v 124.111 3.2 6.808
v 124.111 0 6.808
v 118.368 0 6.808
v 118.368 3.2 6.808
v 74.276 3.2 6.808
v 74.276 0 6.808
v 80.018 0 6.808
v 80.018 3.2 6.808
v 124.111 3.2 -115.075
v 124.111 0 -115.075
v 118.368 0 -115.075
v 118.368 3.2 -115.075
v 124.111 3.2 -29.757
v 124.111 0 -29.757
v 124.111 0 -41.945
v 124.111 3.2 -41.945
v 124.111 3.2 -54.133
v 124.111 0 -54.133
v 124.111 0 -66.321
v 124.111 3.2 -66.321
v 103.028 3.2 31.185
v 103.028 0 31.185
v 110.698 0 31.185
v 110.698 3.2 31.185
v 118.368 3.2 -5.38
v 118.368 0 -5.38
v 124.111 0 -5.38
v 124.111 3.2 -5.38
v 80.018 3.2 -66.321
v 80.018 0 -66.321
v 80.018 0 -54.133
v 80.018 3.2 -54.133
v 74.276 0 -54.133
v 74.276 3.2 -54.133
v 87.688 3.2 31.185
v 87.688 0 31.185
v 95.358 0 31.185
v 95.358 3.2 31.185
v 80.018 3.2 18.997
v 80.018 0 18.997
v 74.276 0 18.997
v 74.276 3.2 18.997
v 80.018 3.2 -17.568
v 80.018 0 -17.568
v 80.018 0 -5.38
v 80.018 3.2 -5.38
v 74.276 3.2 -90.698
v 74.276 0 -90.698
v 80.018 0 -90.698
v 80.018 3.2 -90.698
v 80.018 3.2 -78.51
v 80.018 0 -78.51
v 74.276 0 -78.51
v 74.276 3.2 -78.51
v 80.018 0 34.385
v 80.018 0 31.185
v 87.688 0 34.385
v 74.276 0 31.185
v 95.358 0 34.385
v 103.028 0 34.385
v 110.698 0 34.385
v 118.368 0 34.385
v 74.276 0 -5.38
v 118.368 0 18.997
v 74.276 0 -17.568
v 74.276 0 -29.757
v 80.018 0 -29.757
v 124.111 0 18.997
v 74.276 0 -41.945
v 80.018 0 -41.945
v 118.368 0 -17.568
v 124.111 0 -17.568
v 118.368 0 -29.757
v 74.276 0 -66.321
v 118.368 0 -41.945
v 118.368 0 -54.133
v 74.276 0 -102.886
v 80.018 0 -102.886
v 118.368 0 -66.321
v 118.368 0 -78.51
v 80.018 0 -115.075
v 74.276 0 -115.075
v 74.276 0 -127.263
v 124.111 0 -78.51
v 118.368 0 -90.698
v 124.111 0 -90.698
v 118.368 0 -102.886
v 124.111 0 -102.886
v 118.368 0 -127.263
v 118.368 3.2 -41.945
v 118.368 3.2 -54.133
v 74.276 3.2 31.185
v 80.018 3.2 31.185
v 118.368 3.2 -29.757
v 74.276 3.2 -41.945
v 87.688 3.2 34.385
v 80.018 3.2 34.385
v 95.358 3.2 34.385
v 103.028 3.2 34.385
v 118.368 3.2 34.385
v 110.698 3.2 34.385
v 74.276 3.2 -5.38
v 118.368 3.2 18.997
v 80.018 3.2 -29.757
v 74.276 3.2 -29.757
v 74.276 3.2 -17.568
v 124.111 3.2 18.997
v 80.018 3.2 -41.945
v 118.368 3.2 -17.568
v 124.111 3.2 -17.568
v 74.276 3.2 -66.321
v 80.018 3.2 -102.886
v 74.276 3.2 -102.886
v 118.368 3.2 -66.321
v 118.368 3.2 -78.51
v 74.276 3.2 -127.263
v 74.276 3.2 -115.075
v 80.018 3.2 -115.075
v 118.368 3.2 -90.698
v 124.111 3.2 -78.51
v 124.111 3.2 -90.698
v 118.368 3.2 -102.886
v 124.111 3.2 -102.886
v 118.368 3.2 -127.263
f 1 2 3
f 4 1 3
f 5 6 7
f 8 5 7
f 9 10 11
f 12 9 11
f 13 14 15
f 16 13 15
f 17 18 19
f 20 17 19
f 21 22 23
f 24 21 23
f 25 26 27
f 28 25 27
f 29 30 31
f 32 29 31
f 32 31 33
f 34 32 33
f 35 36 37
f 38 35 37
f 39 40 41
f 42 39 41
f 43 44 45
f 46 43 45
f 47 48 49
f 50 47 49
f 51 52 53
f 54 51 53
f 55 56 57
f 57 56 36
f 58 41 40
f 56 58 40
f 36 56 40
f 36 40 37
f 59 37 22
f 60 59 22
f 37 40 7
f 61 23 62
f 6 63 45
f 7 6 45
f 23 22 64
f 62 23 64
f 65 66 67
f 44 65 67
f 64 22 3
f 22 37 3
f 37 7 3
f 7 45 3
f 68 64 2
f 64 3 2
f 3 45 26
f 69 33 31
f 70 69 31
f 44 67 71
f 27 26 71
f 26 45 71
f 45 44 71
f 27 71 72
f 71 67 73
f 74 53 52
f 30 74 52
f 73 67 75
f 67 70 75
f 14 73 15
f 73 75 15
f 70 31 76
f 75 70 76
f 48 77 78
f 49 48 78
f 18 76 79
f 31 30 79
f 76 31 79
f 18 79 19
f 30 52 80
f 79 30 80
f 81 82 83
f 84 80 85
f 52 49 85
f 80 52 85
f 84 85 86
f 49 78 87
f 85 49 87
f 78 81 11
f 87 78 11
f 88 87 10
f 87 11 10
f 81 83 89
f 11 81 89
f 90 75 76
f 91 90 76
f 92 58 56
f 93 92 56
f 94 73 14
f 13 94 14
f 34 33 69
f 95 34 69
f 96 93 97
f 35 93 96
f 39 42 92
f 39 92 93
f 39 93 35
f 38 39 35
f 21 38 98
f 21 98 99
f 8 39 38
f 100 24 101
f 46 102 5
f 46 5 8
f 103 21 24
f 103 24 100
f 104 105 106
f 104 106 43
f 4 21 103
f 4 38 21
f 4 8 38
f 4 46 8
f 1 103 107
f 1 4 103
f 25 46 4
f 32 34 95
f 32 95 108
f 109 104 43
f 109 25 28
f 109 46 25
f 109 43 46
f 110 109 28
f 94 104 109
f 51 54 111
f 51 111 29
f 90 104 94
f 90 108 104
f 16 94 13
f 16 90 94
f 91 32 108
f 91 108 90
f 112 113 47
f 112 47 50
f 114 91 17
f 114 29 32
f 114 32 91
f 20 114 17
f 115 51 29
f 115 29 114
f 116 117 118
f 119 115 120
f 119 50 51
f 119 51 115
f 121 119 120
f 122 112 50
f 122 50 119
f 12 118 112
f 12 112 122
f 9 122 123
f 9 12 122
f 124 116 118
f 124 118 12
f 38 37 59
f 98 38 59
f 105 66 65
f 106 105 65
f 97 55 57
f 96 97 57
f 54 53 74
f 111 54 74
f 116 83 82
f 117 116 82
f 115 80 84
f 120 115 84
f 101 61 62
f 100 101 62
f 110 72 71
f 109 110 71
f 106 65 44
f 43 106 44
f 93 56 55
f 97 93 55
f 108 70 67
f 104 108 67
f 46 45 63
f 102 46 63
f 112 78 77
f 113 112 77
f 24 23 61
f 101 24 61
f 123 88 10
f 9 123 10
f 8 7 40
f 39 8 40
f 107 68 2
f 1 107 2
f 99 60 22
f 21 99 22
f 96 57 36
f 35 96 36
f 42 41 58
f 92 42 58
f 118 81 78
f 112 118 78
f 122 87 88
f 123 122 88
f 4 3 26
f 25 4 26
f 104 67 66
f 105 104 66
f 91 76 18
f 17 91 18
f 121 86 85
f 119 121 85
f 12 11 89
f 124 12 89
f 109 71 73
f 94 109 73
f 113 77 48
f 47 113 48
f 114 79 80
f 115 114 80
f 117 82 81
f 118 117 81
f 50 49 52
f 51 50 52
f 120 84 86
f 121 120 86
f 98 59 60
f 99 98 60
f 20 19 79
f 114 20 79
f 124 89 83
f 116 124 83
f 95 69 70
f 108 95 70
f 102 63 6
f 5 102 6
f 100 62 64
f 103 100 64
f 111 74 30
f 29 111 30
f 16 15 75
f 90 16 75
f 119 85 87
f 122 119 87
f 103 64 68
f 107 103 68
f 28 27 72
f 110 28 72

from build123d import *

# Parameters (mm, degrees)
BOSS_EXTRUDE3_DEPTH = 3.2


with BuildPart() as part:
    # Sketch1 → Boss-Extrude3 (new body)
    with BuildSketch(Plane(origin=(0, 0, 0), x_dir=(1, 0, 0), z_dir=(0, 1, 0))):
        Polygon((80.018202502, -34.385003933), (87.688185358, -34.385003933), (87.688185358, -31.185003933), (95.358168214, -31.185003933), (95.358168214, -34.385003933), (103.02815107, -34.385003933), (103.02815107, -31.185003933), (110.698133926, -31.185003933), (110.698133926, -34.385003933), (118.368116782, -34.385003933), (118.368116782, -18.996696241), (124.110679366, -18.996696241), (124.110679366, -6.808388549), (118.368116782, -6.808388549), (118.368116782, 5.379919143), (124.110679366, 5.379919143), (124.110679366, 17.568226836), (118.368116782, 17.568226836), (118.368116782, 29.756534528), (124.110679366, 29.756534528), (124.110679366, 41.94484222), (118.368116782, 41.94484222), (118.368116782, 54.133149913), (124.110679366, 54.133149913), (124.110679366, 66.321457605), (118.368116782, 66.321457605), (118.368116782, 78.509765297), (124.110679366, 78.509765297), (124.110679366, 90.69807299), (118.368116782, 90.69807299), (118.368116782, 102.886380682), (124.110679366, 102.886380682), (124.110679366, 115.074688374), (118.368116782, 115.074688374), (118.368116782, 127.262996067), (74.275639917, 127.262996067), (74.275639917, 115.074688374), (80.018202502, 115.074688374), (80.018202502, 102.886380682), (74.275639917, 102.886380682), (74.275639917, 90.69807299), (80.018202502, 90.69807299), (80.018202502, 78.509765297), (74.275639917, 78.509765297), (74.275639917, 66.321457605), (80.018202502, 66.321457605), (80.018202502, 54.133149913), (74.275639917, 54.133149913), (74.275639917, 41.94484222), (80.018202502, 41.94484222), (80.018202502, 29.756534528), (74.275639917, 29.756534528), (74.275639917, 17.568226836), (80.018202502, 17.568226836), (80.018202502, 5.379919143), (74.275639917, 5.379919143), (74.275639917, -6.808388549), (80.018202502, -6.808388549), (80.018202502, -18.996696241), (74.275639917, -18.996696241), (74.275639917, -31.185003933), (80.018202502, -31.185003933), align=None)
    extrude(amount=BOSS_EXTRUDE3_DEPTH)


solid = part.part
